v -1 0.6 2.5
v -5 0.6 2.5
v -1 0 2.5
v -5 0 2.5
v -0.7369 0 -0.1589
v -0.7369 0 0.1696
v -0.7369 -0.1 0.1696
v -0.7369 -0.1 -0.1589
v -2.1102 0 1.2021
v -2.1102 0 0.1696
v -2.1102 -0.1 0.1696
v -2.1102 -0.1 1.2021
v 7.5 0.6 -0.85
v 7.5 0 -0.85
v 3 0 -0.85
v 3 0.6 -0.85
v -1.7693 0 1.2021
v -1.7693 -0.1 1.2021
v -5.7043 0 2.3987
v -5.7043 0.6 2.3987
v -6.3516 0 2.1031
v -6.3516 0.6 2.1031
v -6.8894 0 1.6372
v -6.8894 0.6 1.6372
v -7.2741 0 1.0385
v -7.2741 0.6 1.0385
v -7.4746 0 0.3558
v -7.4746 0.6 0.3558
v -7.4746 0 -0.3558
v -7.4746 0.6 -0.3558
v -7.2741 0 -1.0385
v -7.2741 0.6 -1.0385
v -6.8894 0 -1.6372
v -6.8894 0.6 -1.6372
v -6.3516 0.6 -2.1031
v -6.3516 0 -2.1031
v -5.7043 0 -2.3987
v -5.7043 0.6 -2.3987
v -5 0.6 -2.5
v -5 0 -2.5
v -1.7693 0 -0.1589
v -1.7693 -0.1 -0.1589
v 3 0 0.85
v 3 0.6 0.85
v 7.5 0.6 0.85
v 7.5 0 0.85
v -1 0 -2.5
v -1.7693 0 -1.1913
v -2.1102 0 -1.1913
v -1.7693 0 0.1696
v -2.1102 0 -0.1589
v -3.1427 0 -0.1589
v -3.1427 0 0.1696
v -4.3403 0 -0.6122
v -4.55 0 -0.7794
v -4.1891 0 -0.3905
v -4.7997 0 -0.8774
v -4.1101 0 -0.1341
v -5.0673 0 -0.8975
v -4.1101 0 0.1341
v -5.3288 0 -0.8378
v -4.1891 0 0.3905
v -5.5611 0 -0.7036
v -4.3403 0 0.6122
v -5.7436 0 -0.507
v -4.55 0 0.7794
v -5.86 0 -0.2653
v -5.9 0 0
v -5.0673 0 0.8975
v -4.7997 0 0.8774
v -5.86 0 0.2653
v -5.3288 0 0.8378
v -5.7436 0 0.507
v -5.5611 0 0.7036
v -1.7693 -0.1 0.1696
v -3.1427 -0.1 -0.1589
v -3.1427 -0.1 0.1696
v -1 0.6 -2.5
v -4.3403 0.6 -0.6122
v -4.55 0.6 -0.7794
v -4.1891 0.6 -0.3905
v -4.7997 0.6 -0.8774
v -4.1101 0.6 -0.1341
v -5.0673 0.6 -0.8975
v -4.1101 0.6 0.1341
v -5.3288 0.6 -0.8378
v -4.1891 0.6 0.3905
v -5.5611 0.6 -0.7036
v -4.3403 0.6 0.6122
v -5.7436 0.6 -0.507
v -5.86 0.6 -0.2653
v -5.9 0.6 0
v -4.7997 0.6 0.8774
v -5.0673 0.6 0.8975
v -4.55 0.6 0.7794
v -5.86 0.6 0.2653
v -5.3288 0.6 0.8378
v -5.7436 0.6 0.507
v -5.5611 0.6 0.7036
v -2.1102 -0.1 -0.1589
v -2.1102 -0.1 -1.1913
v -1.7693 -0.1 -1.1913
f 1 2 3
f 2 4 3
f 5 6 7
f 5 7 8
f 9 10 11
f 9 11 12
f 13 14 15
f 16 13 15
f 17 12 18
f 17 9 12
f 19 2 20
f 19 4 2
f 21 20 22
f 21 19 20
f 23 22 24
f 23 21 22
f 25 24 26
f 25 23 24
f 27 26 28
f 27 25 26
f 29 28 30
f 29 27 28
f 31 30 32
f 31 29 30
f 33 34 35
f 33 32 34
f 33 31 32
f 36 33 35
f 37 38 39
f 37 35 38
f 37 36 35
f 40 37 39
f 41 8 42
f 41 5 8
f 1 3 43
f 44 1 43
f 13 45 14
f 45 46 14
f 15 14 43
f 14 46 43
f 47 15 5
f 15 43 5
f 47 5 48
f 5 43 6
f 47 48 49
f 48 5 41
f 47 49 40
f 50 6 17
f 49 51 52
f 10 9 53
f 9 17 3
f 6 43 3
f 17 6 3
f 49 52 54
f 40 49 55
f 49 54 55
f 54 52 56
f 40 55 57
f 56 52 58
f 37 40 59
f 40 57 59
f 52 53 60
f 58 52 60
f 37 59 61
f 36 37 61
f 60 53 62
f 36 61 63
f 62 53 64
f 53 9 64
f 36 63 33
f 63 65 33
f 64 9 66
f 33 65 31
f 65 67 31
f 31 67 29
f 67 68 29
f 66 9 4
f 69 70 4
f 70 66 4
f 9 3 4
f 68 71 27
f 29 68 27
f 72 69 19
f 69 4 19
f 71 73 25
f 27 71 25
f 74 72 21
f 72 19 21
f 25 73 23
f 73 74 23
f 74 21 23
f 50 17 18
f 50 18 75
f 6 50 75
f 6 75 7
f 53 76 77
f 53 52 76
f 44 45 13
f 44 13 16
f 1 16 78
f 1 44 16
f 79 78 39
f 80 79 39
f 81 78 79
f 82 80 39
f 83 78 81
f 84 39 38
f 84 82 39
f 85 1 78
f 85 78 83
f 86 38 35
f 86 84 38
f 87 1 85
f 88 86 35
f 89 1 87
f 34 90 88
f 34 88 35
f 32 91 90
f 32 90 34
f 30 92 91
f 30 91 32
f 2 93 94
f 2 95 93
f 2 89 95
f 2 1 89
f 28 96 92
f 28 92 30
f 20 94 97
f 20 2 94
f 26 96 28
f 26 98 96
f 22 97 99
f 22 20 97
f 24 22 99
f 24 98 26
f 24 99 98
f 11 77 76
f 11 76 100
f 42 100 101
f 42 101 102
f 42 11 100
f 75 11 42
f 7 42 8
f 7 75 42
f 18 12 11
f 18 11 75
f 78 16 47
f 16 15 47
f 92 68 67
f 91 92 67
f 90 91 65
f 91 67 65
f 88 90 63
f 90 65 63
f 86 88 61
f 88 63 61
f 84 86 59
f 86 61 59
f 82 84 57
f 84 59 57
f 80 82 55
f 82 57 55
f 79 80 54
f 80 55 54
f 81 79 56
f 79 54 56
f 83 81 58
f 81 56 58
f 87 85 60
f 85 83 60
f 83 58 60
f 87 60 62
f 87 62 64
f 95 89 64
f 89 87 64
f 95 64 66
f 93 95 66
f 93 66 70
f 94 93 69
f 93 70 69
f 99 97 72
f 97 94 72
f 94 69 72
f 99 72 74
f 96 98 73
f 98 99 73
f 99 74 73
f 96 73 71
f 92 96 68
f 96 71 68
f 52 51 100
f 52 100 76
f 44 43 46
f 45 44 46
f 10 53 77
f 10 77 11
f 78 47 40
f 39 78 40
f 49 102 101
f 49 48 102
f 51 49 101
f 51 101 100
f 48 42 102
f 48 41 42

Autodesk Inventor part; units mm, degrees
ref_plane "YZ Plane" through (0, 0, 0) normal (1, 0, 0) x (0, 1, 0)
ref_plane "XZ Plane" through (0, 0, 0) normal (0, 1, 0) x (-1, 0, 0)
ref_plane "XY Plane" through (0, 0, 0) normal (0, 0, 1) x (1, 0, 0)
sketch "Sketch2" plane through (0, 0, 0) normal (0, 1, 0) x (-1, 0, 0)
  line L0 (-7.5, 0.85) -> (-7.5, -0.85)
  line L1 (1, -2.5) -> (5, -2.5)
  line L2 (7.5, 2.5) -> (-7.5, -2.5) construction
  line L3 (-7.5, 2.5) -> (7.5, -2.5) construction
  arc A0 (5, -2.5) -> (5, 2.5) centre (5, 0) ccw
  circle A1 centre (5, 0) radius 0.9
  line L4 (-3, 0.85) -> (-7.5, 0.85)
  line L5 (-7.5, 0.85) -> (-7.5, -0.85)
  line L6 (-7.5, -0.85) -> (-3, -0.85)
  line L7 (1, 2.5) -> (-3, 0.85)
  line L8 (-3, -0.85) -> (1, -2.5)
  line L9 (5, 2.5) -> (1, 2.5)
  point P0 (0, 0)
  dimension "d3" = 1.8
extrude "Extrusion1" add sketch "Sketch2" along normal blind 0.6
sketch "Sketch3" plane through (0, 0, 0) normal (0, -1, 0) x (1, 0, 0)
  line L0 (-3.4662, 1.2021) -> (-0.4158, 1.2021) construction
  line L1 (-0.4158, 1.2021) -> (-0.4158, -1.1913) construction
  line L2 (-0.4158, -1.1913) -> (-3.4662, -1.1913) construction
  line L3 (-3.4662, -1.1913) -> (-3.4662, 1.2021) construction
  line L4 (-0.7369, -0.1589) -> (-1.7693, -0.1589)
  line L5 (-1.7693, -0.1589) -> (-1.7693, -1.1913)
  line L6 (-1.7693, -1.1913) -> (-2.1102, -1.1913)
  line L7 (-2.1102, -1.1913) -> (-2.1102, -0.1589)
  line L8 (-2.1102, -0.1589) -> (-3.1427, -0.1589)
  line L9 (-3.1427, -0.1589) -> (-3.1427, 0.1696)
  line L10 (-3.1427, 0.1696) -> (-2.1102, 0.1696)
  line L11 (-2.1102, 0.1696) -> (-2.1102, 1.2021)
  line L12 (-2.1102, 1.2021) -> (-1.7693, 1.2021)
  line L13 (-1.7693, 1.2021) -> (-1.7693, 0.1696)
  line L14 (-1.7693, 0.1696) -> (-0.7369, 0.1696)
  line L15 (-0.7369, 0.1696) -> (-0.7369, -0.1589)
  point P0 (0, 0)
extrude "Extrusion2" add sketch "Sketch3" along normal blind 0.1
properties part number "Pin" material "Copper, Alloy"
